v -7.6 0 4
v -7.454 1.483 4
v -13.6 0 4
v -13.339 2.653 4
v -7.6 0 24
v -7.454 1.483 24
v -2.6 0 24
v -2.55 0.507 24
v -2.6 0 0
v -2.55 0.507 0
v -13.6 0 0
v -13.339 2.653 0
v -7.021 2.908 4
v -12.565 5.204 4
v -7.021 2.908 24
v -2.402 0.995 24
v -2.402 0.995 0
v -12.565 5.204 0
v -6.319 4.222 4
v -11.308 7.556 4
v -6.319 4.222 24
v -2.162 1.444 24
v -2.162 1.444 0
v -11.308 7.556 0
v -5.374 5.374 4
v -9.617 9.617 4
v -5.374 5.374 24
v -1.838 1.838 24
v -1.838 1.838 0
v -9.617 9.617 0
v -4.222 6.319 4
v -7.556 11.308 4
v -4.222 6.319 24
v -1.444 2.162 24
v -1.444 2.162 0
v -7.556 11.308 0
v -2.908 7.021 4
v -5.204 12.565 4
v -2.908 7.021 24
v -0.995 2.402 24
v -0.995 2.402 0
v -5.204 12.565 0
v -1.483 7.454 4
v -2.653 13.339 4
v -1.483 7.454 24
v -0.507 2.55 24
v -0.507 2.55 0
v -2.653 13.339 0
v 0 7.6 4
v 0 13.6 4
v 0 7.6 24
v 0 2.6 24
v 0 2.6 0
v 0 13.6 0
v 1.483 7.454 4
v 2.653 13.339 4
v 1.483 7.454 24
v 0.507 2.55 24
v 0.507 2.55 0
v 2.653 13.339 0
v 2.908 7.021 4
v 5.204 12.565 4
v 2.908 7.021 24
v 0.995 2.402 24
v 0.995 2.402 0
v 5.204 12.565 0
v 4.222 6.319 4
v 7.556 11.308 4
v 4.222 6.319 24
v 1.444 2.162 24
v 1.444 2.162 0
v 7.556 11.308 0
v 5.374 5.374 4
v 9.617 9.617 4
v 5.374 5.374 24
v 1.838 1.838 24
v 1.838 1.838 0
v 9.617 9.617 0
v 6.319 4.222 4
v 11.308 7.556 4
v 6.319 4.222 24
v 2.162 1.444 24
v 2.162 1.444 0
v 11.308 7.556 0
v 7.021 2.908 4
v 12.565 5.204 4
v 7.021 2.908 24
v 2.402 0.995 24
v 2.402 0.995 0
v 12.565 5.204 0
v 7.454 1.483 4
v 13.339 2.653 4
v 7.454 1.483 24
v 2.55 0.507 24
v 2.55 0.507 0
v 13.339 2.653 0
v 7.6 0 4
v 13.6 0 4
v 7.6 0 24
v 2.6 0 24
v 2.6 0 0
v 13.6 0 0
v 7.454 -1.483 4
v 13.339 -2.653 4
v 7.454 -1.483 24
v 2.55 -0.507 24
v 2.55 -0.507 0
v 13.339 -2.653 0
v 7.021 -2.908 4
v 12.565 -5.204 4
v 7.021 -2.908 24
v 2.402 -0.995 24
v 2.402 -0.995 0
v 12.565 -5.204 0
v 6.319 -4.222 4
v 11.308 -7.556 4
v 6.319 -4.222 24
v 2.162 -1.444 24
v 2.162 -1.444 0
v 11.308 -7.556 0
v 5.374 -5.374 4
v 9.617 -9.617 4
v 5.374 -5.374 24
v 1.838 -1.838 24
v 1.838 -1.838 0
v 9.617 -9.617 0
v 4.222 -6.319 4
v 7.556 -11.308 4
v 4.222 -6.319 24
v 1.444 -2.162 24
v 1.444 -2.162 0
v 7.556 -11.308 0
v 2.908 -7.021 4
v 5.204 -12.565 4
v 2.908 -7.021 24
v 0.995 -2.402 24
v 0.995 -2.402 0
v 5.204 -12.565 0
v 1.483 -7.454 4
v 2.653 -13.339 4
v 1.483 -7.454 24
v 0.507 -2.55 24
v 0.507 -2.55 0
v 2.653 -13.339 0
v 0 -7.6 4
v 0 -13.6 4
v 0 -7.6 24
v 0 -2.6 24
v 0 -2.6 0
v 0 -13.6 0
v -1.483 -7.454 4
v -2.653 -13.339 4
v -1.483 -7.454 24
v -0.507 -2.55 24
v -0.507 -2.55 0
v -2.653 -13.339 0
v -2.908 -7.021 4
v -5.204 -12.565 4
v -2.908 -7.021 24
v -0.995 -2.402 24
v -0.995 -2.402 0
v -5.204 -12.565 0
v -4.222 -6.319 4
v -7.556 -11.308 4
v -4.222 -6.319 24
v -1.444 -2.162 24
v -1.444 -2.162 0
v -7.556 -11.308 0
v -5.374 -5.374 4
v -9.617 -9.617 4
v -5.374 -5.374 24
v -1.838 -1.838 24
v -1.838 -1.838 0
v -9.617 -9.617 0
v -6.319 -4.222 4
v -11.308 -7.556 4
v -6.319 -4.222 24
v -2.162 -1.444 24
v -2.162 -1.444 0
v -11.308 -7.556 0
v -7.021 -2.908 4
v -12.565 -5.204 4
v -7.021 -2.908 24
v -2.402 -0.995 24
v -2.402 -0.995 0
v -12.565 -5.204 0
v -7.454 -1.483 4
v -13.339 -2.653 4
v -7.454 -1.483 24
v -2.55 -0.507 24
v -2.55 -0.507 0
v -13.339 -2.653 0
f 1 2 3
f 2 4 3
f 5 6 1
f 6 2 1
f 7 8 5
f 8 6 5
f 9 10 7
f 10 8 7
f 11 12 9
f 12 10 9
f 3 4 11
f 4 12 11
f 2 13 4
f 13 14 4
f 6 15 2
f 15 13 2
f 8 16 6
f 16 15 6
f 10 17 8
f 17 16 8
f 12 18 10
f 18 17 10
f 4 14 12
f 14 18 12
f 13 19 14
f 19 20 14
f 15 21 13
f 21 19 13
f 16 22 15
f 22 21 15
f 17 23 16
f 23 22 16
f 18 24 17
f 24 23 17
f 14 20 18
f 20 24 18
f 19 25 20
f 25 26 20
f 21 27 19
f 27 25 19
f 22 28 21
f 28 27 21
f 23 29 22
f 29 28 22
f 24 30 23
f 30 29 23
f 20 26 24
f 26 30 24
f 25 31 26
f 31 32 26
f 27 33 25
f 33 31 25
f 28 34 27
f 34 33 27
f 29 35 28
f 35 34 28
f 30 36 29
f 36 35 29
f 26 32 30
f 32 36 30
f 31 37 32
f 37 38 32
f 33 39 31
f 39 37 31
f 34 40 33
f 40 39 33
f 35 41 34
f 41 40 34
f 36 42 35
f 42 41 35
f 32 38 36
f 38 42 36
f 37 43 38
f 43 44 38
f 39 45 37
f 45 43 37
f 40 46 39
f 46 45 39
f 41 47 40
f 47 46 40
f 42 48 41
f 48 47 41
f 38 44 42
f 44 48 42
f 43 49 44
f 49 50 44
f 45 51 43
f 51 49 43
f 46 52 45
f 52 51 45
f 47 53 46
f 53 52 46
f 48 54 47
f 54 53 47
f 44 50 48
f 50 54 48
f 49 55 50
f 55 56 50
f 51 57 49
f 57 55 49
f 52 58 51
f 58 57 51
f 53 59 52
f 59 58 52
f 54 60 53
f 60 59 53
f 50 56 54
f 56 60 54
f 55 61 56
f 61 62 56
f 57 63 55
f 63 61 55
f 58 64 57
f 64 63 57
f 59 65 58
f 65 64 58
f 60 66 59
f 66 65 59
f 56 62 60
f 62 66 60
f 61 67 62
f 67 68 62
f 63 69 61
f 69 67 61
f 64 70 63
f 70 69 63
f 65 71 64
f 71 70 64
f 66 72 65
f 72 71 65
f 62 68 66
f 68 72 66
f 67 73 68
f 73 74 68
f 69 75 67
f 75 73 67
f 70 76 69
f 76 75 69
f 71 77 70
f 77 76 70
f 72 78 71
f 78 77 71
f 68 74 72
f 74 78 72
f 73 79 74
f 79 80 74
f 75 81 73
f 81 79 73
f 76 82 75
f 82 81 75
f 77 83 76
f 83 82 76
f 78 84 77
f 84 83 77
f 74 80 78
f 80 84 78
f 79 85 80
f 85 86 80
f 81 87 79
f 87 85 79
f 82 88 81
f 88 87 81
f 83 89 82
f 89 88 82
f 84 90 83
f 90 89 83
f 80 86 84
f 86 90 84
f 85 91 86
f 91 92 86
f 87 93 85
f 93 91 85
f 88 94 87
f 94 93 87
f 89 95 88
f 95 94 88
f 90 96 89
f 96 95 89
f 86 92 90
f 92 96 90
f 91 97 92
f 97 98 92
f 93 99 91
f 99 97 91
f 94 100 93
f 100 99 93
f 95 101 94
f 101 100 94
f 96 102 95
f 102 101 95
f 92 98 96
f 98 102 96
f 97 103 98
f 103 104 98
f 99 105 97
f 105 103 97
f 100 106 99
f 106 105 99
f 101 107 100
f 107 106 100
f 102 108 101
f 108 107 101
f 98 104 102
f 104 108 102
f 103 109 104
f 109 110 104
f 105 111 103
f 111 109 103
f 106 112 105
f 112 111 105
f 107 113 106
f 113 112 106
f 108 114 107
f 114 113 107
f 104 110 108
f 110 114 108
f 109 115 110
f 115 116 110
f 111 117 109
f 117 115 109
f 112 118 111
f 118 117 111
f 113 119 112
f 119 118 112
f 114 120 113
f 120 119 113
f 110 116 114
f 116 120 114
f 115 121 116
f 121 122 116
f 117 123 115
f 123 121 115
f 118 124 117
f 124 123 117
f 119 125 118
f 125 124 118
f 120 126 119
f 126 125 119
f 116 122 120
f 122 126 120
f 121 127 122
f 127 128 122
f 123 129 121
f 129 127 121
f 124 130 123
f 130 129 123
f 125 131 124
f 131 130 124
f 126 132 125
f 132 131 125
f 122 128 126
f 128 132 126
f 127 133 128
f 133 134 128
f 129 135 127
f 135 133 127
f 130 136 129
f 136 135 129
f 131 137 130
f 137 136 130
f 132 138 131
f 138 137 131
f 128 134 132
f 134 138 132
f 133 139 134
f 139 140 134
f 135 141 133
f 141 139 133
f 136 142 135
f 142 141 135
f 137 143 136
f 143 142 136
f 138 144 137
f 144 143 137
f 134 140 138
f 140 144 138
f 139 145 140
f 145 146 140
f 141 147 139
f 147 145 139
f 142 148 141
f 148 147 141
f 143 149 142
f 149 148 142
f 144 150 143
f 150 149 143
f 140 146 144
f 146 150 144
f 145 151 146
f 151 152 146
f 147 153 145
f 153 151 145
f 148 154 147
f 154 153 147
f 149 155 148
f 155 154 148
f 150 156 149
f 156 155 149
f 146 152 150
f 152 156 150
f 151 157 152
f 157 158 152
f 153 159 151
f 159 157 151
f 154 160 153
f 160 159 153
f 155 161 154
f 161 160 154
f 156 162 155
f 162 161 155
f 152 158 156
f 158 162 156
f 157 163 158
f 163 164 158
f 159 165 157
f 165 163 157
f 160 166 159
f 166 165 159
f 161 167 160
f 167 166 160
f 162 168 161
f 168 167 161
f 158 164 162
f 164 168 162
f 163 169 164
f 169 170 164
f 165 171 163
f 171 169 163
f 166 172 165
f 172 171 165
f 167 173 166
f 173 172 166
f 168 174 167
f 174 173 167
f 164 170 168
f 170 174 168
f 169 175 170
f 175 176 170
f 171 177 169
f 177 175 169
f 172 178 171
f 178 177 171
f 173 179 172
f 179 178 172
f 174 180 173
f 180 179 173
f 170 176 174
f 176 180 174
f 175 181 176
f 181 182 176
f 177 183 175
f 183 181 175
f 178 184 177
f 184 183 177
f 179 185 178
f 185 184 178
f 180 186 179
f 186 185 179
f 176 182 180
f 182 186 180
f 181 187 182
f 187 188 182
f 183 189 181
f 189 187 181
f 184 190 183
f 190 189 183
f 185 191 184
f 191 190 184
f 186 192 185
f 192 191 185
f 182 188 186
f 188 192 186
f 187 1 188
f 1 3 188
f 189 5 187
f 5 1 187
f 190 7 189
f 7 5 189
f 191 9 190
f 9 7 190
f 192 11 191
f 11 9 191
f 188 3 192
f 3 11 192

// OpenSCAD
$fn = 32;

// ----------------------------------------------------------------------
// Profiled standoff: flanged spacer, 24 mm long, bore 5.2 mm
// ----------------------------------------------------------------------

// --- parameters (mm) ---
revolve_angle = 360;      // full turn around the Z axis
profile_points = 6;       // points of the closed outline

profile = [[2.6, 0], [13.6, 0], [13.6, 4], [7.6, 4], [7.6, 24], [2.6, 24]];  // single closed polygon, 6 points, counter clockwise

// --- the one profile operation ---
rotate_extrude(angle = revolve_angle) polygon(points = profile);
